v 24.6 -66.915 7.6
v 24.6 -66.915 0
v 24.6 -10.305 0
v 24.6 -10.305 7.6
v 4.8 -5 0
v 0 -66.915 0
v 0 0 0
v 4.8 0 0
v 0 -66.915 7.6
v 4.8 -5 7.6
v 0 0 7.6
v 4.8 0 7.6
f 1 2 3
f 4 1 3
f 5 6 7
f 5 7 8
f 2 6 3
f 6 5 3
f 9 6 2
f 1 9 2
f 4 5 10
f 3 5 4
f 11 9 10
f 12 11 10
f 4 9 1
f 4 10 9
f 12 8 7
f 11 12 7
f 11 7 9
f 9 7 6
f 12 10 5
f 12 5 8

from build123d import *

# Parameters (mm, degrees)
EXTRUDE_1_DEPTH          = 7.6
CUT_EXTRUDE_1_DEPTH      = 72.697539881
CUT_EXTRUDE_1_DEPTH_BACK = 72.697539881


with BuildPart() as part:
    # 草图1 → 凸台-拉伸1 (new body)
    with BuildSketch(Plane.XY):
        Polygon((4.8, 0), (0, 0), (0, -66.915), (24.6, -66.915), (24.6, 0), (19.8, 0), (19.8, -5), (4.8, -5), align=None)
    extrude(amount=EXTRUDE_1_DEPTH)

    # 草图2 → 切除-拉伸1 (cut, two sides: drawn at the far end of the back side and taken through both)
    with BuildSketch(Plane.XY.offset(7.6).offset(-CUT_EXTRUDE_1_DEPTH_BACK)):
        Polygon((19.8, -5), (4.8, -5), (24.6, -10.30539401), (24.6, 0), (19.8, 0), align=None)
    extrude(amount=CUT_EXTRUDE_1_DEPTH + CUT_EXTRUDE_1_DEPTH_BACK, mode=Mode.SUBTRACT)


solid = part.part
